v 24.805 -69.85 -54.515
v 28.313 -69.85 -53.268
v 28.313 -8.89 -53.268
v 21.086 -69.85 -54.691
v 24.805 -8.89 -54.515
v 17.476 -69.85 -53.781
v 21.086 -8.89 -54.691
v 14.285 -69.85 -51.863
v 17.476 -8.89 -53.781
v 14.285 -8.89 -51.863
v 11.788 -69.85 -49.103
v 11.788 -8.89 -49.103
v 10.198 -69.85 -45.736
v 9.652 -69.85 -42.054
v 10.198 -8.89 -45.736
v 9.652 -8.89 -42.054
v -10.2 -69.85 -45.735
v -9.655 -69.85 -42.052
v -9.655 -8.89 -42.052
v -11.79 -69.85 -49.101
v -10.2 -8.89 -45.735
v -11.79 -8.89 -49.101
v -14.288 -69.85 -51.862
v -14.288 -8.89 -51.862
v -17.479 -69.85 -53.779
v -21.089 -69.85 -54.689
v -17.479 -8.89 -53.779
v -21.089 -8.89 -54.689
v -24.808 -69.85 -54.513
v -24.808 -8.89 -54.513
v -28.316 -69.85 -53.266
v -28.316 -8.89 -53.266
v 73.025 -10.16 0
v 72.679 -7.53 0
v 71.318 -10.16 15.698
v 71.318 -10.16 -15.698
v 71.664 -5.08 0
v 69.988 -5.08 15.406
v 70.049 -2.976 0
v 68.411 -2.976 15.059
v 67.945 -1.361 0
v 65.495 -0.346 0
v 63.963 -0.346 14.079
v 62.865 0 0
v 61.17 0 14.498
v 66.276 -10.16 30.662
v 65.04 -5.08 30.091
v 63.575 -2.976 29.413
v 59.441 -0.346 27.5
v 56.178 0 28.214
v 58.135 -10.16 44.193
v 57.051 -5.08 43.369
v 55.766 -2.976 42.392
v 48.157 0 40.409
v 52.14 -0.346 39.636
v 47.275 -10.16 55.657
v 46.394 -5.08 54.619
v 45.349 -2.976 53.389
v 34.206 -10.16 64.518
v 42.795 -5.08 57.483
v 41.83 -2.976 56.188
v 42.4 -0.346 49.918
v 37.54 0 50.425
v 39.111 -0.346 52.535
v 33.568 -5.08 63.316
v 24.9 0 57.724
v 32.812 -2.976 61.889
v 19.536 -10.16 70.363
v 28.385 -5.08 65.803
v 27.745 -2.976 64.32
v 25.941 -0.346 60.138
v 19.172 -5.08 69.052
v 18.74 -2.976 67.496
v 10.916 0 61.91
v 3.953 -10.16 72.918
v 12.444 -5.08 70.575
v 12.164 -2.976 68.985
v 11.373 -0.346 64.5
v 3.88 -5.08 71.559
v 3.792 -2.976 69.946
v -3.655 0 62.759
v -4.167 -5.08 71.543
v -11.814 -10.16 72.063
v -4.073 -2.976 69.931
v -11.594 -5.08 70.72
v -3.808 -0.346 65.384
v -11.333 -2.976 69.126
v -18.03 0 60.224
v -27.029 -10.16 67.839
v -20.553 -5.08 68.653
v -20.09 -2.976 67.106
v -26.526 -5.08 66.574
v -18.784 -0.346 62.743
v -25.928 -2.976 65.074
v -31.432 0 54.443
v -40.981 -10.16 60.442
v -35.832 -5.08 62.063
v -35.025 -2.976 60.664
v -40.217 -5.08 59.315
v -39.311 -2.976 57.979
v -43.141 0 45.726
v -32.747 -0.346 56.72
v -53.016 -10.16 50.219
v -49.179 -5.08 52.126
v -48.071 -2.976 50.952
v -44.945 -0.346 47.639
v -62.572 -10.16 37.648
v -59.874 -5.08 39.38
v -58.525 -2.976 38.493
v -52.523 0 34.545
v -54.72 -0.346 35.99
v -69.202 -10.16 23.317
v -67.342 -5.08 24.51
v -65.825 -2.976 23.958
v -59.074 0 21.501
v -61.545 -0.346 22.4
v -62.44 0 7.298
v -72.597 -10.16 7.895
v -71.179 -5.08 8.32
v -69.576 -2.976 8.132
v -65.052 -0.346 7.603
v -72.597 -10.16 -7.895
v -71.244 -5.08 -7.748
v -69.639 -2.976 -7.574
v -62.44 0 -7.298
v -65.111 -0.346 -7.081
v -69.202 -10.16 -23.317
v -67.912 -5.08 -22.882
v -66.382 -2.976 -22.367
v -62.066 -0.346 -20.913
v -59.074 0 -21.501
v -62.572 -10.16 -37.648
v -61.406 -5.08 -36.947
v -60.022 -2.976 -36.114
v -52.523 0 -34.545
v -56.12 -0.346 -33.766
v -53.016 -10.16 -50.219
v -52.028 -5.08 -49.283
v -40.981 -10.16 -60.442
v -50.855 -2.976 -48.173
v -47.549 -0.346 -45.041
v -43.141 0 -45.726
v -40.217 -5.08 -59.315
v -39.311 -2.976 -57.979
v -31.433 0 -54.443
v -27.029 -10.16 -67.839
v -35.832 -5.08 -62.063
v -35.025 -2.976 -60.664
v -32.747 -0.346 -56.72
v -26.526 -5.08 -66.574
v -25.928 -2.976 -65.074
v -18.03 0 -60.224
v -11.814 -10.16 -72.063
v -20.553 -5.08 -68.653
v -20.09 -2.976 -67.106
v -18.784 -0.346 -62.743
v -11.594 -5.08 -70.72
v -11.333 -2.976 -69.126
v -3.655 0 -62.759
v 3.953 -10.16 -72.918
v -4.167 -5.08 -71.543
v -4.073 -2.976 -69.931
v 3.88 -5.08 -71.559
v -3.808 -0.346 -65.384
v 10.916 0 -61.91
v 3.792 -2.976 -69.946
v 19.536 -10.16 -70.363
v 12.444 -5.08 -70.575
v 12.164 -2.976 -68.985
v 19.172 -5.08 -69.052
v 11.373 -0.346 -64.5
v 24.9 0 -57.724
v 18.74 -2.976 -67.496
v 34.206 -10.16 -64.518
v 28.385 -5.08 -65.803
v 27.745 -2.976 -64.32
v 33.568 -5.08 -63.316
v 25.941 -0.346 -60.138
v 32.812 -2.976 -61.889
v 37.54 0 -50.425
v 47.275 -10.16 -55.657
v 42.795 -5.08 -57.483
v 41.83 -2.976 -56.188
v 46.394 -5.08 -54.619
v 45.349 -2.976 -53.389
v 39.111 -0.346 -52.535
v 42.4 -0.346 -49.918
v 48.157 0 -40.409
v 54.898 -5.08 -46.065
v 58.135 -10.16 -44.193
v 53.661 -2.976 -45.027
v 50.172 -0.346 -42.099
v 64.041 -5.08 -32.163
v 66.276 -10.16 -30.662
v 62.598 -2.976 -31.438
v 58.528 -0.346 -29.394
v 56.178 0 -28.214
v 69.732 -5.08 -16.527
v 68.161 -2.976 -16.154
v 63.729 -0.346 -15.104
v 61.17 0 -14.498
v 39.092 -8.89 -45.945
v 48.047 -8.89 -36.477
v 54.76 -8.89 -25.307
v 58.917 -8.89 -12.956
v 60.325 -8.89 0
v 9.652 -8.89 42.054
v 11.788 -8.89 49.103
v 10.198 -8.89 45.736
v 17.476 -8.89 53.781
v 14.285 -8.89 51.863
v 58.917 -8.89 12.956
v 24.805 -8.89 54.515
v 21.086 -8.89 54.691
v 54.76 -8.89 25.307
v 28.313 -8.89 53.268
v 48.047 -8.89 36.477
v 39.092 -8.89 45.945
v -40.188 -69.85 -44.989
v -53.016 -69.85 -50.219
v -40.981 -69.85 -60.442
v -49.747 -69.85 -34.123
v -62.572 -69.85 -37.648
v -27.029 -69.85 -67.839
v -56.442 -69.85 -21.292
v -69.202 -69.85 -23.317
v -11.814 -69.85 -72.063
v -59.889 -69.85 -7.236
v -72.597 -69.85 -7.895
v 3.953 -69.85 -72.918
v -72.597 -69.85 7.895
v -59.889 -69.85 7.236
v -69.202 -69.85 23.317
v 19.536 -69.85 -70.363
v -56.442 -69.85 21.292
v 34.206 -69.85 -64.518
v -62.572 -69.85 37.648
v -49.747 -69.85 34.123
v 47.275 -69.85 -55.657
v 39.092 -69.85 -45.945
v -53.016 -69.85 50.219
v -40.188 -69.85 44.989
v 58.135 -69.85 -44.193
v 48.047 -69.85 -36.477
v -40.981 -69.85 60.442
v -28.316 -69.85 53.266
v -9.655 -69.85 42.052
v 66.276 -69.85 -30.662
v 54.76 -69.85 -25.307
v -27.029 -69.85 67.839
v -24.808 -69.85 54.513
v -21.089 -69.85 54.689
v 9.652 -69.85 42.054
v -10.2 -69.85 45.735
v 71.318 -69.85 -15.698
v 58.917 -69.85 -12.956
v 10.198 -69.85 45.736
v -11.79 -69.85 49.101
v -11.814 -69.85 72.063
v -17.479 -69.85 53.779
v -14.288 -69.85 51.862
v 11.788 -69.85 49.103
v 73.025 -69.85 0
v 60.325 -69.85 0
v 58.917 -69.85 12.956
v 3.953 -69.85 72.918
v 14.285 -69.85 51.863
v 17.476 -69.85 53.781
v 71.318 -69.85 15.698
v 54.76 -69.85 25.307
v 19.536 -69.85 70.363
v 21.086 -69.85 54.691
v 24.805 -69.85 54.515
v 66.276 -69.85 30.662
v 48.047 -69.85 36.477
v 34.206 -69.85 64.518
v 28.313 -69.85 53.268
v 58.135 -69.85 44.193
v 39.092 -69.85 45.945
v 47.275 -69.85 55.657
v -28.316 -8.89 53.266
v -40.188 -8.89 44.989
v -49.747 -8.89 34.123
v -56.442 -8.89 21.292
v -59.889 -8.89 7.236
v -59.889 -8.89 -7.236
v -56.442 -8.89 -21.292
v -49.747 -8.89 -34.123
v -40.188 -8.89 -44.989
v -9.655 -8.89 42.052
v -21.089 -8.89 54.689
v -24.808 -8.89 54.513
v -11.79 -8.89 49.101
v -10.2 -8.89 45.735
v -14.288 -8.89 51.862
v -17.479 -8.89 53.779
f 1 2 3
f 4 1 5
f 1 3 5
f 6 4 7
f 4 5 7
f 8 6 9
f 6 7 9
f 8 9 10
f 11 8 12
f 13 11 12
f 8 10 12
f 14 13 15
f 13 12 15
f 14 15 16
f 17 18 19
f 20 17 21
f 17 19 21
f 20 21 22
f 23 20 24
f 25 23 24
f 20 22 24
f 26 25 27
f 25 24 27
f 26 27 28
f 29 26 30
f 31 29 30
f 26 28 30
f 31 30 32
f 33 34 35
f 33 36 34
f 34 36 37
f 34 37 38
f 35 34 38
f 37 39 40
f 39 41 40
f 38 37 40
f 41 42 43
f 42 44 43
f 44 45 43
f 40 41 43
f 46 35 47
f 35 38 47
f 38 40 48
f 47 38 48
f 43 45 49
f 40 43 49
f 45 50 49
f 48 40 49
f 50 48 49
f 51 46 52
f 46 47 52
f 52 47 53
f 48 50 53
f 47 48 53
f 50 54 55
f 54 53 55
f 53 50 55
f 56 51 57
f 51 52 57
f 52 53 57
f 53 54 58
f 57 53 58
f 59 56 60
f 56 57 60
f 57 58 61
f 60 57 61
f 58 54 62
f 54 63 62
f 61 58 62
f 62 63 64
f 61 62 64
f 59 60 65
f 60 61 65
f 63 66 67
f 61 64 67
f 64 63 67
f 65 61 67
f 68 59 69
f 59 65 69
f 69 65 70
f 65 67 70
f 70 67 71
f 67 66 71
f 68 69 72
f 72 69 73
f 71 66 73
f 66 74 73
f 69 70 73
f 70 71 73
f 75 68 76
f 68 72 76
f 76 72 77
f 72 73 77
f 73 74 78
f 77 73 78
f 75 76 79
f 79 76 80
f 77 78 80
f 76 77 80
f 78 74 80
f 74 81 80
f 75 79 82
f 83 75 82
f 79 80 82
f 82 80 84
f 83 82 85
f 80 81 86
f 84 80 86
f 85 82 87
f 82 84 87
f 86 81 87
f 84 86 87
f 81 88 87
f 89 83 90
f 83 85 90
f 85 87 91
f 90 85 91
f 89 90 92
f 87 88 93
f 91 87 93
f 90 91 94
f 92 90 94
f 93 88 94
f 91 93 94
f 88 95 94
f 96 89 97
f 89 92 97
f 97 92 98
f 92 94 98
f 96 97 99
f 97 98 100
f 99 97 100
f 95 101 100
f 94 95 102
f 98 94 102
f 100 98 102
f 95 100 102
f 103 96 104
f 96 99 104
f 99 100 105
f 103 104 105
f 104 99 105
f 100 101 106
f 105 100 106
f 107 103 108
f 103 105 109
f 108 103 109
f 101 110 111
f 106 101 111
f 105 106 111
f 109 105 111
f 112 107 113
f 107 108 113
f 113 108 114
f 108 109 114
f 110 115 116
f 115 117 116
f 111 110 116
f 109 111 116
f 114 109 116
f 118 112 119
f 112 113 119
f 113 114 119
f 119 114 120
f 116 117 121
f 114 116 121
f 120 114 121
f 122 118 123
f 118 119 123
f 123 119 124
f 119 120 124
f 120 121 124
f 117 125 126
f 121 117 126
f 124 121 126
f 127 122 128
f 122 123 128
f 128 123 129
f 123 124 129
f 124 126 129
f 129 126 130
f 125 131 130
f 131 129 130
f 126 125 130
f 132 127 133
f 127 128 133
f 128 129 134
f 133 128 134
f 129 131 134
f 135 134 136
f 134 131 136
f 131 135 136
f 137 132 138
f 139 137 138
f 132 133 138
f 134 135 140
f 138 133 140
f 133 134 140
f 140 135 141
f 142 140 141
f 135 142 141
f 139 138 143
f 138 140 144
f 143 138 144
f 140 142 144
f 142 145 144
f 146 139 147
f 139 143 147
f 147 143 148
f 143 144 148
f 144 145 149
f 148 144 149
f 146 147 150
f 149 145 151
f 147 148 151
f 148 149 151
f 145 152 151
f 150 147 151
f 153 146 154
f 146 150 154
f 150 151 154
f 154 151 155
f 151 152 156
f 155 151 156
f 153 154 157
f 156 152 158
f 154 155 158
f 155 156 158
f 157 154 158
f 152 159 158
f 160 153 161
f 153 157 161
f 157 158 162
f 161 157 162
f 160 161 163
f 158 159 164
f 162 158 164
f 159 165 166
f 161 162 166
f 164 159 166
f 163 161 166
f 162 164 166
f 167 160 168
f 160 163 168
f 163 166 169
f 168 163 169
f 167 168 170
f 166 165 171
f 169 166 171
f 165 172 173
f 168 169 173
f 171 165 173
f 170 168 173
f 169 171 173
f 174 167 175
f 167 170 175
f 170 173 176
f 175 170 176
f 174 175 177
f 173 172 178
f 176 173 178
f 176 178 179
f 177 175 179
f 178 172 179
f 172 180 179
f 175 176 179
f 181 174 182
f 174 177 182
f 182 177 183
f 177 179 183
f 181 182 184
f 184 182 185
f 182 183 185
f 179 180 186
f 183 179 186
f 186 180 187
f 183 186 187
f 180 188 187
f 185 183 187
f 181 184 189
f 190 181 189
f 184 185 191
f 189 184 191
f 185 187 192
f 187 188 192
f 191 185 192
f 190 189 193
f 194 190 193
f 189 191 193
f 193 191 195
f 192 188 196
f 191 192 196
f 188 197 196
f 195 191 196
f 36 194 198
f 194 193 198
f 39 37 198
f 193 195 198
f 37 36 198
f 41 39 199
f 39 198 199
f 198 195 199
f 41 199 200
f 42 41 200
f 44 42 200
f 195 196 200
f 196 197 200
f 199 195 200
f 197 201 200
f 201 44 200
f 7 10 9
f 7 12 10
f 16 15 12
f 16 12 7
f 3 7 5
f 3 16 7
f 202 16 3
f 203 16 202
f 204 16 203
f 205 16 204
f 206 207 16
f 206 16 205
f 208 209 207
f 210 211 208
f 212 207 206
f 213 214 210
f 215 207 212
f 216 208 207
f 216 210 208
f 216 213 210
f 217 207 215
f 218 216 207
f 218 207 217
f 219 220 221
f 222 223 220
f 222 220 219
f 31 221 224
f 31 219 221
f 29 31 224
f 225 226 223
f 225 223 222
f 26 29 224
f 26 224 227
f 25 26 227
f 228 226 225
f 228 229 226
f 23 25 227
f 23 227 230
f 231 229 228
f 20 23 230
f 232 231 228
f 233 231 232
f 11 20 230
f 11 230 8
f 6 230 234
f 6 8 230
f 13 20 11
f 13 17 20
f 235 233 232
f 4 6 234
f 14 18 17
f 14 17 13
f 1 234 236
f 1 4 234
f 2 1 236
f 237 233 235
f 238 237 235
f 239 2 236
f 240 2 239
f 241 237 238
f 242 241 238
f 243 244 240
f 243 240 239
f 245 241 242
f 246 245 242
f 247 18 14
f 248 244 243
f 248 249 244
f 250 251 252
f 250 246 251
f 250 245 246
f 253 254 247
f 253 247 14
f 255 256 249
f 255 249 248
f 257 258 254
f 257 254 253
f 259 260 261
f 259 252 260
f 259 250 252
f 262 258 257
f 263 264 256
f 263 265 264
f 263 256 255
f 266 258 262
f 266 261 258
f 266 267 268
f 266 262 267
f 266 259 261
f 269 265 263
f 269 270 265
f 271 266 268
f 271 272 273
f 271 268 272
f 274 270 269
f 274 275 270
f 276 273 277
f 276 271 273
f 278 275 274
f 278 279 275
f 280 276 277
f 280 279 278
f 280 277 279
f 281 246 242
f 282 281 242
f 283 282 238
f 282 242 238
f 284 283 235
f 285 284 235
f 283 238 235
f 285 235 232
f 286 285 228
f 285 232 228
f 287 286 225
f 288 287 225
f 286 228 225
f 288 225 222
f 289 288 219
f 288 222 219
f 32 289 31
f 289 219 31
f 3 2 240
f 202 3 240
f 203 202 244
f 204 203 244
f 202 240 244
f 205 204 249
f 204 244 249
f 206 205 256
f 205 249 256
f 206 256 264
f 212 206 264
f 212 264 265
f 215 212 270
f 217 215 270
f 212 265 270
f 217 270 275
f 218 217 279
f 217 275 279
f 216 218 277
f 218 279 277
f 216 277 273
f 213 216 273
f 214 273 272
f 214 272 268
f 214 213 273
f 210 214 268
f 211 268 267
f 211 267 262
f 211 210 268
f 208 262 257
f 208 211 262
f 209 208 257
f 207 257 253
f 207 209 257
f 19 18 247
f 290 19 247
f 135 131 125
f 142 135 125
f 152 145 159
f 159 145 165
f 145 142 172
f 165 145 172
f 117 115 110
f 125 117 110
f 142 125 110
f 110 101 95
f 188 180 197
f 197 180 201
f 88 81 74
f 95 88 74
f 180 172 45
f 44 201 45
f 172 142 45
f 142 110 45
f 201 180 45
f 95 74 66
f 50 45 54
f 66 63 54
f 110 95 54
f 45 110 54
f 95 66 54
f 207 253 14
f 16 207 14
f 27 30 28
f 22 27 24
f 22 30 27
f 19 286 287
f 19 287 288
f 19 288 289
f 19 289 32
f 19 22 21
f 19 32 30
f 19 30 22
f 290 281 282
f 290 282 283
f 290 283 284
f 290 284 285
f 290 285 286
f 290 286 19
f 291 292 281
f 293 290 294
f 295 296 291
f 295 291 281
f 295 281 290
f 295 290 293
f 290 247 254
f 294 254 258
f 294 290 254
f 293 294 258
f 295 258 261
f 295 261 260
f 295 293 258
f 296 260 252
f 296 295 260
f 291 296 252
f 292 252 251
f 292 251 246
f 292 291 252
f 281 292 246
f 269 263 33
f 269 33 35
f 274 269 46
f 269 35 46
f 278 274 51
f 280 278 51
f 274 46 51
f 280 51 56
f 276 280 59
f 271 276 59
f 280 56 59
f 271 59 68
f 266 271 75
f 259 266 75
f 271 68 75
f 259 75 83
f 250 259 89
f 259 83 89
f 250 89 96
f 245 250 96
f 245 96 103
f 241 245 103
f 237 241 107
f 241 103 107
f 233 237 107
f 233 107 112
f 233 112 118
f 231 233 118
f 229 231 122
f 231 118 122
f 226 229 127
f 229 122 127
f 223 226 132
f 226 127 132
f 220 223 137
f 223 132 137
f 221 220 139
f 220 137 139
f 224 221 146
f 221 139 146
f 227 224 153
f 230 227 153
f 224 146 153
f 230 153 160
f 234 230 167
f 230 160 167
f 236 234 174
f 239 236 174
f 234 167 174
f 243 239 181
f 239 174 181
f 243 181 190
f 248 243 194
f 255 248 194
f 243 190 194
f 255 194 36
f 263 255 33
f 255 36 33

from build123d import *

# Parameters (mm, degrees)
F0_R     = 73.025
F1_DEPTH = 69.85
F3_DEPTH = 60.96
F4_R     = 12.7
F5_R     = 10.16


with BuildPart() as f1:
    # F0 (on Front) → F1 (new body)
    with BuildSketch(Plane.XZ):
        Circle(F0_R)
    extrude(amount=F1_DEPTH)

    # F2 (on face) → F3 (cut)
    with BuildSketch(Plane.XZ.offset(69.85)):
        with BuildLine():
            Line((-9.6547204396, -59.5473928752), (-9.6547204396, 59.5473928752))
            ThreePointArc((-9.6547204396, 59.5473928752), (-60.325, 0), (-9.6547204396, -59.5473928752))
        make_face()
        with BuildLine():
            ThreePointArc((9.652, -59.5478338901), (45.9421512611, -39.0950682631), (60.325, 0))
            ThreePointArc((60.325, 0), (45.9421512611, 39.0950682631), (9.652, 59.5478338901))
            Line((9.652, 59.5478338901), (9.652, -59.5478338901))
        make_face()
    extrude(amount=-F3_DEPTH, mode=Mode.SUBTRACT)

    # F4
    f4_edges = [f1.edges().sort_by_distance(p)[0] for p in [
        (9.652, -39.37, 59.547834),
        (-9.65472, -39.37, 59.547393),
        (9.652, -39.37, -59.547834),
        (-9.65472, -39.37, -59.547393),
    ]]
    fillet(f4_edges, radius=F4_R)

    # F5
    f5_edges = [f1.edges().sort_by_distance(p)[0] for p in [
        (-73.025, 0, 0),
    ]]
    fillet(f5_edges, radius=F5_R)


solid = f1.part
